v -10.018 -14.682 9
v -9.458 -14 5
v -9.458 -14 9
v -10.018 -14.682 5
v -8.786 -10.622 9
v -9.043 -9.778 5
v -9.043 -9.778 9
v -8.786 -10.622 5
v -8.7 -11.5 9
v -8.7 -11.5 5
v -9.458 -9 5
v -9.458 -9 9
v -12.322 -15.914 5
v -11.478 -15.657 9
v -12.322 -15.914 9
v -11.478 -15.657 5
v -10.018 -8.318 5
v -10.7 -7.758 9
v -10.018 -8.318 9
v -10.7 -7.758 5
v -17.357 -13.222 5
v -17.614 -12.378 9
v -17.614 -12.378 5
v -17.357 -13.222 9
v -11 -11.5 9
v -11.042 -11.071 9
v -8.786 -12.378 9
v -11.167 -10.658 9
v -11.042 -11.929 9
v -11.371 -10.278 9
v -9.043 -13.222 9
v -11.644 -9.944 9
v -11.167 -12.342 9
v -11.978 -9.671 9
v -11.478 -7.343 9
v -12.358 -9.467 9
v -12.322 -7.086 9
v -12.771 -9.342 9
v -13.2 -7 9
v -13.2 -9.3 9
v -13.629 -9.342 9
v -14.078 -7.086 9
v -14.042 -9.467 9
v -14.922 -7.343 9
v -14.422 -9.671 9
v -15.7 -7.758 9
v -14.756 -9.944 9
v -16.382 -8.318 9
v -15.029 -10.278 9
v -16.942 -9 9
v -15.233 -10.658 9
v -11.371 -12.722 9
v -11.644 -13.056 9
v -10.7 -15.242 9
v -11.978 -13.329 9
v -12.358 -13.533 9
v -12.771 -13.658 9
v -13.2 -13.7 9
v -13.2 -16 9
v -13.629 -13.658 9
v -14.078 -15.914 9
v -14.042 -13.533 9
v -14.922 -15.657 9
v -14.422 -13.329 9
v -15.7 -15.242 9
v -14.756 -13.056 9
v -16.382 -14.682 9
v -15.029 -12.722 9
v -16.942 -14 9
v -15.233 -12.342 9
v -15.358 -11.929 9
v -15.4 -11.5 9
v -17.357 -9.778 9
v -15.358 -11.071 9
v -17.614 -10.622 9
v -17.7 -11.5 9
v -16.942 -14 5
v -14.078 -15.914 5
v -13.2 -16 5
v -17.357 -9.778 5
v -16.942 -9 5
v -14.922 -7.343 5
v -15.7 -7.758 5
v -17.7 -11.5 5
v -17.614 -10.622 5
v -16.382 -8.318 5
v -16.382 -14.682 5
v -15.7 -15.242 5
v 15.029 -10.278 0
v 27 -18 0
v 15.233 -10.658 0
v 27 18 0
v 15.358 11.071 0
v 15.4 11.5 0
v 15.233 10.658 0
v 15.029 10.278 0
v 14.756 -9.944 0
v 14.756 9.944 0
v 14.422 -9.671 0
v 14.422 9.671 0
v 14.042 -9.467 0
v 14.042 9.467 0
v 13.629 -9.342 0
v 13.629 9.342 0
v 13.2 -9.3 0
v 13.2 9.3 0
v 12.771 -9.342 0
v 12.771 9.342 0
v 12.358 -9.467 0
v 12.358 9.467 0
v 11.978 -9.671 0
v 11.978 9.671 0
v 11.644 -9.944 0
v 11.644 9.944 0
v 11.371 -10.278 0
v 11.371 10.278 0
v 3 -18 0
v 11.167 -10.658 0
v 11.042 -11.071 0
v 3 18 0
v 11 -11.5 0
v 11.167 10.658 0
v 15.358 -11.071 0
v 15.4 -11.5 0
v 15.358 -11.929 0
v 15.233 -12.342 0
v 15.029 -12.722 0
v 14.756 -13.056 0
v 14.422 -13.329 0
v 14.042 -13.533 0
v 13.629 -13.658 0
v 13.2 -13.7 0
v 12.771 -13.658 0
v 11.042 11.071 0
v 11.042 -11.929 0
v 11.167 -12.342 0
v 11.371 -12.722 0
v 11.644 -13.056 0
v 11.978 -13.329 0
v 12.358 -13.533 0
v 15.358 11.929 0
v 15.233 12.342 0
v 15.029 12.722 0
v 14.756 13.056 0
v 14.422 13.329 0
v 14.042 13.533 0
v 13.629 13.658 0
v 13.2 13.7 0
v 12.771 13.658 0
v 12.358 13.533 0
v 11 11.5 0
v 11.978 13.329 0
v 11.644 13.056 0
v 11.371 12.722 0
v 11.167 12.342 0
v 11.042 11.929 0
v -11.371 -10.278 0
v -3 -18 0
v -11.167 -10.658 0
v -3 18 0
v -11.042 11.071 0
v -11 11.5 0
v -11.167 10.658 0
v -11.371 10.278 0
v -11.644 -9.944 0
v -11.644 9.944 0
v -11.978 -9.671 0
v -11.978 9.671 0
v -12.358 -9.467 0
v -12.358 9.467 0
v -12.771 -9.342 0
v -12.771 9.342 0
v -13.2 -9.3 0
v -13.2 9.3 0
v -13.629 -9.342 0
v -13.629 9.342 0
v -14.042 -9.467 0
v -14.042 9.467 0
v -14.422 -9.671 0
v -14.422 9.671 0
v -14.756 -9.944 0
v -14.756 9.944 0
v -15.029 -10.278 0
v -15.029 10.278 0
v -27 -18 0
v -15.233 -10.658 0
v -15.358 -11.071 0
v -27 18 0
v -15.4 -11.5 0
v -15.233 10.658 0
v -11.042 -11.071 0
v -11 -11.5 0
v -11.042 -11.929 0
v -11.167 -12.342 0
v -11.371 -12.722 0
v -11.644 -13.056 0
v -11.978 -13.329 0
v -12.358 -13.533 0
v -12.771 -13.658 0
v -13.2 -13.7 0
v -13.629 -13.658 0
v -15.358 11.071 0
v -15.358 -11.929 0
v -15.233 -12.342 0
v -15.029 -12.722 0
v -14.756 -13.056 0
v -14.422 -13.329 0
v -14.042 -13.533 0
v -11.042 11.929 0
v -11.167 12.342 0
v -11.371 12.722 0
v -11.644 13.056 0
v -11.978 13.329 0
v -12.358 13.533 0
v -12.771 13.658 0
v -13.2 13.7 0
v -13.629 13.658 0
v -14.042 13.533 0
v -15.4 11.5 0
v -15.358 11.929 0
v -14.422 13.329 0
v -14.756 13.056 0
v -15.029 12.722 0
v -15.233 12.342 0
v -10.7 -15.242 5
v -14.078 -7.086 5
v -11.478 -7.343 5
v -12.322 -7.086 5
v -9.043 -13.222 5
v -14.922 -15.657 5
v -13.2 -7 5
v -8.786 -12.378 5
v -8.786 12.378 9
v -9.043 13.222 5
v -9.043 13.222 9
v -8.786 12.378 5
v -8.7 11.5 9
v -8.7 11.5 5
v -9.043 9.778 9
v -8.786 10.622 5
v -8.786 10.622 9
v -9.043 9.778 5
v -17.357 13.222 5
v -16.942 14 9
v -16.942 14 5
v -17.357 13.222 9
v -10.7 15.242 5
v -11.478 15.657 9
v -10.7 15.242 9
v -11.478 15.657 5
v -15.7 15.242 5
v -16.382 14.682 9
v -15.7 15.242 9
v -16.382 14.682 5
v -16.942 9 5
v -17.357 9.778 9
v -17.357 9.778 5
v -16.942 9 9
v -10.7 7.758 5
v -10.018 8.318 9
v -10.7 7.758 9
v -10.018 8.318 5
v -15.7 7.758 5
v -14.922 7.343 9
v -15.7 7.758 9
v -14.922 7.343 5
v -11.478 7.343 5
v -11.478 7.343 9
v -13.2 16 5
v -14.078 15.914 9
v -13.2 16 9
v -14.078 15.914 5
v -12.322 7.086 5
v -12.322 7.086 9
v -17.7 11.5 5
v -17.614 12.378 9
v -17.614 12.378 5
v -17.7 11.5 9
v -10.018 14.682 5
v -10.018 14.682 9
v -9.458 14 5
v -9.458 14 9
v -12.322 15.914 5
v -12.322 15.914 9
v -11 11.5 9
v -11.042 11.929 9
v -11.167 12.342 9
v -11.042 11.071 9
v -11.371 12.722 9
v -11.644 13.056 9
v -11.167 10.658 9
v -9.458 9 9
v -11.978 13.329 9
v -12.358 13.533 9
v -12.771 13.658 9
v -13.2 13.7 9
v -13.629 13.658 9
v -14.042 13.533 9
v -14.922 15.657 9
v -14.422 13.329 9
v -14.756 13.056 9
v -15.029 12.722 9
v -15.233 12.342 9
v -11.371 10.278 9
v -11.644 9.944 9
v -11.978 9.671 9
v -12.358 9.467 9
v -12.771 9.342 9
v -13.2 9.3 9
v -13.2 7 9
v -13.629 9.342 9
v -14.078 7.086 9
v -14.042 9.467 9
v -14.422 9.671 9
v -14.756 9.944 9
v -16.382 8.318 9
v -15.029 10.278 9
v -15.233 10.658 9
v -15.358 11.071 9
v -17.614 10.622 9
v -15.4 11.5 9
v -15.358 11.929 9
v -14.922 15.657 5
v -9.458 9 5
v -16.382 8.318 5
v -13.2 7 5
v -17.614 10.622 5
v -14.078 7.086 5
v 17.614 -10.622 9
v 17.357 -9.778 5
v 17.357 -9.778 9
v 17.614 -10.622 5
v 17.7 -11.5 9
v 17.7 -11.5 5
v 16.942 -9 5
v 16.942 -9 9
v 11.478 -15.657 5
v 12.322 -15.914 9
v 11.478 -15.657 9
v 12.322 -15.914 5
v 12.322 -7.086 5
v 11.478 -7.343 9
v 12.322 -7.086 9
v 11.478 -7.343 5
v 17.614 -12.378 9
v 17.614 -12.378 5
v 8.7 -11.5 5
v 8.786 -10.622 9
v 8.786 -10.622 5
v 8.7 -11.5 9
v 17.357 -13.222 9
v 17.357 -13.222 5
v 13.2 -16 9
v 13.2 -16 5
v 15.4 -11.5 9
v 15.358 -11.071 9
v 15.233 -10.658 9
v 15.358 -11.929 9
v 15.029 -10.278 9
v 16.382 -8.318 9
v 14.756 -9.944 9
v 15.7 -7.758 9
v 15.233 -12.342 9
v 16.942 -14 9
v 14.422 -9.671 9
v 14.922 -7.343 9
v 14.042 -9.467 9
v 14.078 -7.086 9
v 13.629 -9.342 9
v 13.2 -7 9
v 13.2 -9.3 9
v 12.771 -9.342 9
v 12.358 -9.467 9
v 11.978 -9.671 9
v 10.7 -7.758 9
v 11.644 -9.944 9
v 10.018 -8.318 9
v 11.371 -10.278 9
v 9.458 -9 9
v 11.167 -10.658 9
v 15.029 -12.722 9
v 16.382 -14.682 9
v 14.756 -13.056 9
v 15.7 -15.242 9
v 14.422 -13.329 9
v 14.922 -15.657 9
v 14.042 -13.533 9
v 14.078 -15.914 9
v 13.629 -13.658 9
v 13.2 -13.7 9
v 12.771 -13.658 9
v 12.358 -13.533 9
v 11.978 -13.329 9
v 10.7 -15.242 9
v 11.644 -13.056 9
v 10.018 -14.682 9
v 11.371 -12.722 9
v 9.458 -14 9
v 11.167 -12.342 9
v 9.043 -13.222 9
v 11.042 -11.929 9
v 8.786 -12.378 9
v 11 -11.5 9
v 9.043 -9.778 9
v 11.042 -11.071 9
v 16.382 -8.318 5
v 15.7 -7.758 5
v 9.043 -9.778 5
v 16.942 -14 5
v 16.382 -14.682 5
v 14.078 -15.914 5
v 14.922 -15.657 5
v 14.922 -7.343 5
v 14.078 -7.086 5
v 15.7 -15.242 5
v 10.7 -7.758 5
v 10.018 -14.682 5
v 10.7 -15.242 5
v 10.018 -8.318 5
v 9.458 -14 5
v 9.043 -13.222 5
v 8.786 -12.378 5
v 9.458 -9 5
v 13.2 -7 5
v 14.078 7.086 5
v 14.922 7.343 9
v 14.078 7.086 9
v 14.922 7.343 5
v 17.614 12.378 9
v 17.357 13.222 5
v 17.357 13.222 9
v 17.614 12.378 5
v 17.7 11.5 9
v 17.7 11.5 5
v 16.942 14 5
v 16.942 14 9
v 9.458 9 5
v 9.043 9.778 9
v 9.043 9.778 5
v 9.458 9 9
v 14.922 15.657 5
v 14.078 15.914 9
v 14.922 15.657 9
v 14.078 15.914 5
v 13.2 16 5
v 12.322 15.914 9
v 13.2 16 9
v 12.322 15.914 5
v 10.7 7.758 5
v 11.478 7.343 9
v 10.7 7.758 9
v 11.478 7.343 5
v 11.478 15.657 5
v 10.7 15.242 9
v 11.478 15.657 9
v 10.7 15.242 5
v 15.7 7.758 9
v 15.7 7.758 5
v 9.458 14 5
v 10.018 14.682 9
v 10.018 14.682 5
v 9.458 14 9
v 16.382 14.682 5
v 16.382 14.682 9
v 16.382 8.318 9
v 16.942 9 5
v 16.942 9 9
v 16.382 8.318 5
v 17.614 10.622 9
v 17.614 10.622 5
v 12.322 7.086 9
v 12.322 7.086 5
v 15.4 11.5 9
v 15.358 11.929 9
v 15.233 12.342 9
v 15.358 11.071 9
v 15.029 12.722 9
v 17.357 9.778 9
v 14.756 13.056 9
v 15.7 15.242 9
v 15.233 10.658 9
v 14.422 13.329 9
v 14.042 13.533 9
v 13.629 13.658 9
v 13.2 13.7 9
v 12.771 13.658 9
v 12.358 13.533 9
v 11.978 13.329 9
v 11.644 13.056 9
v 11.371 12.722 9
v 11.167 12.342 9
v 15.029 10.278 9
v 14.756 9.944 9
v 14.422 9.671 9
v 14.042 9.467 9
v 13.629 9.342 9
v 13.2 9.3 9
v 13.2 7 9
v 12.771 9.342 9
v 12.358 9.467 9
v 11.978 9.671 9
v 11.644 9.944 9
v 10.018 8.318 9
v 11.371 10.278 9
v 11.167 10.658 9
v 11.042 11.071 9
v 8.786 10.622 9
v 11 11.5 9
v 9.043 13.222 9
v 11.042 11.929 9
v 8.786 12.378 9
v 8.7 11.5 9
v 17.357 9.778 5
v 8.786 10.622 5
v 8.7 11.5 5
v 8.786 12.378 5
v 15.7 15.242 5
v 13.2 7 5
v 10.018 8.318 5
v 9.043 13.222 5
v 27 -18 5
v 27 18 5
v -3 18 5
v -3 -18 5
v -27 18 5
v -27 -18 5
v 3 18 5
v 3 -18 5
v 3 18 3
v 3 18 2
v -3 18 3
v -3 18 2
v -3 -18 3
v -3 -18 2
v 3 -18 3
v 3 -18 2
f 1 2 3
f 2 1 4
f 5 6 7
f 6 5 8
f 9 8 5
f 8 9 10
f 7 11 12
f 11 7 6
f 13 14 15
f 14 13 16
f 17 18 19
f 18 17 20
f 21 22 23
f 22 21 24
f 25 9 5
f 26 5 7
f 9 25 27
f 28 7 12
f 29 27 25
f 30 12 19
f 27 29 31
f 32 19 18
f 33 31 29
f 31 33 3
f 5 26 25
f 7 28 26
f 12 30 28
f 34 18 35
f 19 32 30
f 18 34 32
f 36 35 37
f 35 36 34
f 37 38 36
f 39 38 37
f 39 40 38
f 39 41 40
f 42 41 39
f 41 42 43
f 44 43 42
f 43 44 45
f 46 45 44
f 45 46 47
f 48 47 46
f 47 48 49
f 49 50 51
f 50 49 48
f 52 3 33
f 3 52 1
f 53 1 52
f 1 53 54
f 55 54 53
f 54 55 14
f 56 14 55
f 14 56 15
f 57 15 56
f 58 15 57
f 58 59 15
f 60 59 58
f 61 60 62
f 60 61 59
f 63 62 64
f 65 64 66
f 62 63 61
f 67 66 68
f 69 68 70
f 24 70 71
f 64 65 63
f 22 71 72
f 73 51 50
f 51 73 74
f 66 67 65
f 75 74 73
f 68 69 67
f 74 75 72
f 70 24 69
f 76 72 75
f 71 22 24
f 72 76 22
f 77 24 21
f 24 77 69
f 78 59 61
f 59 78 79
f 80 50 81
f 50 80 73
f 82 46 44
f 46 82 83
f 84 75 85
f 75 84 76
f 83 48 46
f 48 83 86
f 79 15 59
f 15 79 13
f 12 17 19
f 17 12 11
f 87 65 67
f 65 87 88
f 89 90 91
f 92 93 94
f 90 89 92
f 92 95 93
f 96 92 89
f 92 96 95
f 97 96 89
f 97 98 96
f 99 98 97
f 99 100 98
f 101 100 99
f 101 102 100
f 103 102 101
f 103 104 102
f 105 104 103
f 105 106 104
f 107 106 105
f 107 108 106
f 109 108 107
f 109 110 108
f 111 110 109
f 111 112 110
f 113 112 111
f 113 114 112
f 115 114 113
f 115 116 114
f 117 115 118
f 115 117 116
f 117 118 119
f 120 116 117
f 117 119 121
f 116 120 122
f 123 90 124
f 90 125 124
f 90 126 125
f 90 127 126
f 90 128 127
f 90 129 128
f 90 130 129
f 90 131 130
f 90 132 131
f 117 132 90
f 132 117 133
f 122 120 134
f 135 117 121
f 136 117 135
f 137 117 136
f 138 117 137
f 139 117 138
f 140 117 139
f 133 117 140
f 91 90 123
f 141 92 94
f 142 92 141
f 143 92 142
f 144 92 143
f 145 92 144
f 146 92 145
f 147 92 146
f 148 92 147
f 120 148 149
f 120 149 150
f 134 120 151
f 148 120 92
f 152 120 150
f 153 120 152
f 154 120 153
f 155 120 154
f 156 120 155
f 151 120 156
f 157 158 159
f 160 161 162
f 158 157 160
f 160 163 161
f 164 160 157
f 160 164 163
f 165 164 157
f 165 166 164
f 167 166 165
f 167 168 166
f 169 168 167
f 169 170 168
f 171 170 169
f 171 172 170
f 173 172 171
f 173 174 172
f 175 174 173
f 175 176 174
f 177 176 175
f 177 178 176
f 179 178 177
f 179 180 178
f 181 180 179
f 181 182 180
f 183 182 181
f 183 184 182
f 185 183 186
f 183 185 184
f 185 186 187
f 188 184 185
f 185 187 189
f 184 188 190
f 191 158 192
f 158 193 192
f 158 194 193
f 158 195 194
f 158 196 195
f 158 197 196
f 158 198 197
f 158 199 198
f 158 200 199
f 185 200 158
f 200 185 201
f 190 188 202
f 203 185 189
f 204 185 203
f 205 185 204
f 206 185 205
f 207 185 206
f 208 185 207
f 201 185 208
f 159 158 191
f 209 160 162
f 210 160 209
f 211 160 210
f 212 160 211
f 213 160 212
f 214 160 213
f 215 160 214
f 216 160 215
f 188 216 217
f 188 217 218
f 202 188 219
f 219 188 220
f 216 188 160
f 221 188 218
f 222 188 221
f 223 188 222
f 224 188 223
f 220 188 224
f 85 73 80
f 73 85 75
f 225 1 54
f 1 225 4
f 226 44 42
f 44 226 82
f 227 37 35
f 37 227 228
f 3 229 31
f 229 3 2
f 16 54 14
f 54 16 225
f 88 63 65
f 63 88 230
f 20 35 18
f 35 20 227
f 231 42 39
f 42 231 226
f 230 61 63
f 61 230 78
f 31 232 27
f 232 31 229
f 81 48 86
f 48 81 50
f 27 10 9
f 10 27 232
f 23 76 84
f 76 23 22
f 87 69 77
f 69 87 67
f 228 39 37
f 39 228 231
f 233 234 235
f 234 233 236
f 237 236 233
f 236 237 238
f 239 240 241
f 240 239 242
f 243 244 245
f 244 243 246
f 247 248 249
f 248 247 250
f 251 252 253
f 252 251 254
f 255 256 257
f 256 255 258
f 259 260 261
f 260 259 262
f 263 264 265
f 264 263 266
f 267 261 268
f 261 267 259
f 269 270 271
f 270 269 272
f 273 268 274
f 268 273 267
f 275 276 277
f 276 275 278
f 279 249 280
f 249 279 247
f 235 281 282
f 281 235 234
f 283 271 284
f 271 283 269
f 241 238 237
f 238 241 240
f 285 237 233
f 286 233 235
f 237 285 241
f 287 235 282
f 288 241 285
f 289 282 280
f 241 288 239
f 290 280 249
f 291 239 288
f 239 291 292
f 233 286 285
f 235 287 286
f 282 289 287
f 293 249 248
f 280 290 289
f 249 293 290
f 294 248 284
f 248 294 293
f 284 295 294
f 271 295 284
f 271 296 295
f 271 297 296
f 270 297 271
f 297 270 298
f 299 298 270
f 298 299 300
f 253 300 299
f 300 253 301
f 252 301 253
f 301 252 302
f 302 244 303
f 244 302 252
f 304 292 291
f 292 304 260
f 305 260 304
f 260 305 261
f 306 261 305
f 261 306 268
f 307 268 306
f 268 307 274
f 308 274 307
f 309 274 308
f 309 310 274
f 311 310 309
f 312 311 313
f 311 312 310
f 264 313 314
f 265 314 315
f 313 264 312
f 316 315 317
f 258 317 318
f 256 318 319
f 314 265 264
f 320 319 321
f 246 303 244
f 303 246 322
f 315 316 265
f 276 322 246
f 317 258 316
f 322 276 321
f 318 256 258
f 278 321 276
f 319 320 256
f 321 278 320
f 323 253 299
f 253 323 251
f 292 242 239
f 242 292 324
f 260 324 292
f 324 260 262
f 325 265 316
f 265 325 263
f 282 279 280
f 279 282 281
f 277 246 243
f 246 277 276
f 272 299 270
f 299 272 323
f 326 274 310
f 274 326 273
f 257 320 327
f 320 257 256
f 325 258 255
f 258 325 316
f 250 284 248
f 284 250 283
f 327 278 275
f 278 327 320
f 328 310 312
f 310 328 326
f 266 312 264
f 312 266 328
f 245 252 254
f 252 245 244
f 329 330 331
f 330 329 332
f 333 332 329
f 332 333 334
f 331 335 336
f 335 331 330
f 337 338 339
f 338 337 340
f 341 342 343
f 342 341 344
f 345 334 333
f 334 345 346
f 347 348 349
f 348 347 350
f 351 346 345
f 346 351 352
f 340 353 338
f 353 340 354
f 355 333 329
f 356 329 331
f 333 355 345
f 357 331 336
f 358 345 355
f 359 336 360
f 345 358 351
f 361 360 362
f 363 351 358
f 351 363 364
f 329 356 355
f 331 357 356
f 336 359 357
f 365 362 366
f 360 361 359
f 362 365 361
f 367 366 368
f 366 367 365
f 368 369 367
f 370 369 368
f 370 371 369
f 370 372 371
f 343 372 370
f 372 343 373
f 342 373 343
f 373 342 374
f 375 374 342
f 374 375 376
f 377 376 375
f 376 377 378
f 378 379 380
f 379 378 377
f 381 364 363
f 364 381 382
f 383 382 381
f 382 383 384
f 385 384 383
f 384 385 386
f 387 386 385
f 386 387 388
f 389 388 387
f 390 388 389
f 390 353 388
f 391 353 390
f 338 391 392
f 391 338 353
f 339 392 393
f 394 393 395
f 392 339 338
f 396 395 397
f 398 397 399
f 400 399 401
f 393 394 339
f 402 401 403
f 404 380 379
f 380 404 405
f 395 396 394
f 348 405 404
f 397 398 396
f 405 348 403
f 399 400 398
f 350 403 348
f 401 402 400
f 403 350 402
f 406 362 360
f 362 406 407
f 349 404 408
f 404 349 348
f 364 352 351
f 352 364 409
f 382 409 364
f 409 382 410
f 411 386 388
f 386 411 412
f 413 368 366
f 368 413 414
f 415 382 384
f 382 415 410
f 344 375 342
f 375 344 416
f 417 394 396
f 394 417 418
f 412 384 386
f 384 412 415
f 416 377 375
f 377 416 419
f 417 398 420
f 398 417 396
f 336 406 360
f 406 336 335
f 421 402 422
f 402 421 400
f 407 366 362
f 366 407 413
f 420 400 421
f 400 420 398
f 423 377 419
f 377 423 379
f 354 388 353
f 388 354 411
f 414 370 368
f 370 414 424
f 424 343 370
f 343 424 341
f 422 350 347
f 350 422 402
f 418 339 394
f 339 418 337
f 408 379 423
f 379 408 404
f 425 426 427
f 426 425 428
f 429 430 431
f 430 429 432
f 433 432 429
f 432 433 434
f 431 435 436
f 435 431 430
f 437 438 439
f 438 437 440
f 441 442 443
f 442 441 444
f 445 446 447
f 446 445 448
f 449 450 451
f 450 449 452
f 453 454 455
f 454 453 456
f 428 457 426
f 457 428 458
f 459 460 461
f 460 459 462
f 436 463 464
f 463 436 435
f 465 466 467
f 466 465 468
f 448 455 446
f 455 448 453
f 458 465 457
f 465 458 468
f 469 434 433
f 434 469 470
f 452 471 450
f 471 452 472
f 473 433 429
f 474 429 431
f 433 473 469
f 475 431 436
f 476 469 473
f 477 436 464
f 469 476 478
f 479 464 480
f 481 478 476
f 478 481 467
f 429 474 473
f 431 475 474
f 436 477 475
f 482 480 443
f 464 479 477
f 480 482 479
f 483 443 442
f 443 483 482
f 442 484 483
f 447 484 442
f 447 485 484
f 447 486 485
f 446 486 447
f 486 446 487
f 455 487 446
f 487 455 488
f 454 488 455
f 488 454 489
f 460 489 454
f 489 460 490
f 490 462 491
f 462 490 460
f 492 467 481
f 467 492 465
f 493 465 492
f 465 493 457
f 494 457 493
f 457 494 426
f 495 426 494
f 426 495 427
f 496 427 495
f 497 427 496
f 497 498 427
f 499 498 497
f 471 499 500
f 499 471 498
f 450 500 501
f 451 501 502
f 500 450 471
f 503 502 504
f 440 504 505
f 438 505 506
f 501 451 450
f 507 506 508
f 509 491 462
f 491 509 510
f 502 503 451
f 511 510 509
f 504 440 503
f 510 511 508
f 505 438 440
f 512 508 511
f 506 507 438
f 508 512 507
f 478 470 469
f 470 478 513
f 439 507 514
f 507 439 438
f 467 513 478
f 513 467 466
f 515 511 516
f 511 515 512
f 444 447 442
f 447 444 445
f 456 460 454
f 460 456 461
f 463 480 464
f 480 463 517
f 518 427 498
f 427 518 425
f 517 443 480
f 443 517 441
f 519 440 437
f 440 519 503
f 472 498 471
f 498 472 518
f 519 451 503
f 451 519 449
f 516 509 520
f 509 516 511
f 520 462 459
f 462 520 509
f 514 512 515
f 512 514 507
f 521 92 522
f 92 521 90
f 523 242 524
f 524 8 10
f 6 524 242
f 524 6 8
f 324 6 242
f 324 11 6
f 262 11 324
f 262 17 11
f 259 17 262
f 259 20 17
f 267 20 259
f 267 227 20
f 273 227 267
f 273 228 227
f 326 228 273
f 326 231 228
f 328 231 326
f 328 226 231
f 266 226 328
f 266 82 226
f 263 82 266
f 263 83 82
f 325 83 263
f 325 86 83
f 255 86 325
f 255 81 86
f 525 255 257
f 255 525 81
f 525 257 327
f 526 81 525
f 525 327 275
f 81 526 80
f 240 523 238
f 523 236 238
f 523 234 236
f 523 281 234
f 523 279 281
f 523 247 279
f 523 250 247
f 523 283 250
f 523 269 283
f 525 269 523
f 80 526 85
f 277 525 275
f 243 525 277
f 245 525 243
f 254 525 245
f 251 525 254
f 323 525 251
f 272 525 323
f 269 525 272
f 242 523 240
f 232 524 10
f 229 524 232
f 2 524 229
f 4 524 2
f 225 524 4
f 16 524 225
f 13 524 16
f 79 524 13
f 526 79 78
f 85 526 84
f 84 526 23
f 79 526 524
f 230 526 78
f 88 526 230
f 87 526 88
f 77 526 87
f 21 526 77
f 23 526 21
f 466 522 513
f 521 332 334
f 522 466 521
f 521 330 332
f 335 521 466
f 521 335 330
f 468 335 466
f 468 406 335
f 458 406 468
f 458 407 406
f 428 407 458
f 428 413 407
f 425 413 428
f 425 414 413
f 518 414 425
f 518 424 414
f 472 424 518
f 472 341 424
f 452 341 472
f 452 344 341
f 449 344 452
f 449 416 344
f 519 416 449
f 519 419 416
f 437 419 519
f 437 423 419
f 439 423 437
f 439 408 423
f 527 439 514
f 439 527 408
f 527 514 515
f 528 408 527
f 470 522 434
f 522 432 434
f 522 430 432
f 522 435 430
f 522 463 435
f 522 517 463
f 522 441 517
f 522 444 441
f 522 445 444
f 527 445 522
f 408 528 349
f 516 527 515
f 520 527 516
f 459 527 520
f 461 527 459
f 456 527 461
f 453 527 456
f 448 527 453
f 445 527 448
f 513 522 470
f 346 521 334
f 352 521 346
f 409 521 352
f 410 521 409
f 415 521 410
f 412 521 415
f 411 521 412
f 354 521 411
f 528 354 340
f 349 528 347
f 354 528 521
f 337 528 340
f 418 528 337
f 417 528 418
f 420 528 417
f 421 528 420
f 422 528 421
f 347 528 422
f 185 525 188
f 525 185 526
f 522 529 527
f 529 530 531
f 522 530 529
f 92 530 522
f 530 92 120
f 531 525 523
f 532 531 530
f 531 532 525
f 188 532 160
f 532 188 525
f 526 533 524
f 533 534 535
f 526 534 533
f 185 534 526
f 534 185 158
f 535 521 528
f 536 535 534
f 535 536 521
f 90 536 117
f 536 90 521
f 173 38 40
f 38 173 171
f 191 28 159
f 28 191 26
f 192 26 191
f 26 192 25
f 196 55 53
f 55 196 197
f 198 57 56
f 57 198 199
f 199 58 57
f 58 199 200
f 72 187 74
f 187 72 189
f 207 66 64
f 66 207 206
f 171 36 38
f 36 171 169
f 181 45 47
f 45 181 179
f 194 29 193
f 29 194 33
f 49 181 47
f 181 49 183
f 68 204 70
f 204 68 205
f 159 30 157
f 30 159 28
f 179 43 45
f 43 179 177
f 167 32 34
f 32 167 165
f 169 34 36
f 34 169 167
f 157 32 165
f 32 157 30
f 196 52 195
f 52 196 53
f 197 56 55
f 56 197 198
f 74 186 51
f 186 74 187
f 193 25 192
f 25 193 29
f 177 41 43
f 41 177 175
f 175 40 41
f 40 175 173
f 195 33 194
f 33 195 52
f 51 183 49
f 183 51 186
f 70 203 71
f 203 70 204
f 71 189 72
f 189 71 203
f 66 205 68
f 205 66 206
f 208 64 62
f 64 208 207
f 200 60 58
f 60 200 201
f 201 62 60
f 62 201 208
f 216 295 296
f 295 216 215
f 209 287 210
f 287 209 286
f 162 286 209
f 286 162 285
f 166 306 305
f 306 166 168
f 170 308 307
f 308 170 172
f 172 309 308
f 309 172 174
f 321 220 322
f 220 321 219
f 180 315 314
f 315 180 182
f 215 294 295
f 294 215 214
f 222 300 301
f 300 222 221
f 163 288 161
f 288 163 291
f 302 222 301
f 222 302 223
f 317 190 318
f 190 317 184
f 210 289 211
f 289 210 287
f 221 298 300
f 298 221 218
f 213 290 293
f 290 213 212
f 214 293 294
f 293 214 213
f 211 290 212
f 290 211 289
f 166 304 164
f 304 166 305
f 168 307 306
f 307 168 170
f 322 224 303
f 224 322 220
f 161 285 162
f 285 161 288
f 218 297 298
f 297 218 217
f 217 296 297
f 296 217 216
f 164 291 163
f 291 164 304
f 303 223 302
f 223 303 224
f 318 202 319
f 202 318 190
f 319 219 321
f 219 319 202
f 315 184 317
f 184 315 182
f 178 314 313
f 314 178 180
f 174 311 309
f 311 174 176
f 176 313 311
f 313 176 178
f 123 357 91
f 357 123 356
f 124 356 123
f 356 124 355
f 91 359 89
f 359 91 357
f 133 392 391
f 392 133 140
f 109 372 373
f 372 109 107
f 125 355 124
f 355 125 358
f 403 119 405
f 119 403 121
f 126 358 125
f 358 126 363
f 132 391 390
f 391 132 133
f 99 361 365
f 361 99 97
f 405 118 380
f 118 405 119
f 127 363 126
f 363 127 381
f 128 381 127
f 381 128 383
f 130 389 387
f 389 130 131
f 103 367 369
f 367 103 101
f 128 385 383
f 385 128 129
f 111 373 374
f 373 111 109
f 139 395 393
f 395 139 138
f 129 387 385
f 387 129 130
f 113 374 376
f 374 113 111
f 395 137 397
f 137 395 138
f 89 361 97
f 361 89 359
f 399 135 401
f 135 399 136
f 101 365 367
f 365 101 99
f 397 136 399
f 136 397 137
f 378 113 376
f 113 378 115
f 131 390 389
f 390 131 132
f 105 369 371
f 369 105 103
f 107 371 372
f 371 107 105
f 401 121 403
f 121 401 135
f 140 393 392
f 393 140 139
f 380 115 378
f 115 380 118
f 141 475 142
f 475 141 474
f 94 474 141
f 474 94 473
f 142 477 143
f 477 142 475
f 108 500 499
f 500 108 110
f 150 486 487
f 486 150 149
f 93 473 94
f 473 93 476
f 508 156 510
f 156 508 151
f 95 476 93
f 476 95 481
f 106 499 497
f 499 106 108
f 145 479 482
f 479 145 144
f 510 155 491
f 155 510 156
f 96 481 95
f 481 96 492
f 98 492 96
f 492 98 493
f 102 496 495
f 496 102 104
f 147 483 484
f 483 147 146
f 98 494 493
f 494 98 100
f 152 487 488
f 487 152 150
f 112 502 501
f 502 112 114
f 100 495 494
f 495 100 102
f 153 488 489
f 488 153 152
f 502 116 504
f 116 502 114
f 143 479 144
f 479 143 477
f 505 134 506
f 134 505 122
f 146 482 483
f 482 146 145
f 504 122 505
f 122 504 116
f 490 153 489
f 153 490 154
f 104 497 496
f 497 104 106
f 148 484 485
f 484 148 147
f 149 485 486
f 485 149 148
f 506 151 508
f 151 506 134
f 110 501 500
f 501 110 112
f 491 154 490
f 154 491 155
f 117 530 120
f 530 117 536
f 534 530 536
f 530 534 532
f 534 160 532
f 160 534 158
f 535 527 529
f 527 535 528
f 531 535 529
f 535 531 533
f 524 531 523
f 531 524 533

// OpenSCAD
$fn = 32;

// ----------------------------------------------------------------------
// Living hinge: 54 x 36 mm plates, 1 mm flexible web
// ----------------------------------------------------------------------

// --- parameters (mm) ---
plate_len = 24;           // plate length outside the web
plate_w = 36;             // plate width
thick = 5;                // plate thickness
web_half = 3;             // half width of the flex band
web_t = 1;                // flexible web thickness
web_z = 2;                // web position inside the thickness
boss_d = 9;               // screw boss diameter
boss_h = 9;               // screw boss height
boss_x = 13.2;            // screw boss distance from the web
screw_d = 4.4;            // screw hole

difference() {
  union() {
    /* one flat strip, later thinned at the middle */
    translate([-27, -18, 0]) cube([54, 36, 5]);
    /* screw bosses, sunk 0.5 mm into the plates */
    for (sx = [-13.2, 13.2]) {
      for (sy = [-11.5, 11.5]) {
        translate([sx, sy, 0]) cylinder(h = boss_h, d = boss_d);
      }
    }
  }
  /* channel from below: leaves the web on top of it */
  translate([-3, -20.5, -2.5]) cube([6, 41, 4.5]);
  /* channel from above: thins the web down to web_t */
  translate([-3, -20.5, 3]) cube([6, 41, 4.5]);
  /* screw holes through the bosses */
  for (sx = [-13.2, 13.2]) {
    for (sy = [-11.5, 11.5]) {
      translate([sx, sy, -2.5]) cylinder(h = boss_h + 5, d = screw_d);
    }
  }
}
